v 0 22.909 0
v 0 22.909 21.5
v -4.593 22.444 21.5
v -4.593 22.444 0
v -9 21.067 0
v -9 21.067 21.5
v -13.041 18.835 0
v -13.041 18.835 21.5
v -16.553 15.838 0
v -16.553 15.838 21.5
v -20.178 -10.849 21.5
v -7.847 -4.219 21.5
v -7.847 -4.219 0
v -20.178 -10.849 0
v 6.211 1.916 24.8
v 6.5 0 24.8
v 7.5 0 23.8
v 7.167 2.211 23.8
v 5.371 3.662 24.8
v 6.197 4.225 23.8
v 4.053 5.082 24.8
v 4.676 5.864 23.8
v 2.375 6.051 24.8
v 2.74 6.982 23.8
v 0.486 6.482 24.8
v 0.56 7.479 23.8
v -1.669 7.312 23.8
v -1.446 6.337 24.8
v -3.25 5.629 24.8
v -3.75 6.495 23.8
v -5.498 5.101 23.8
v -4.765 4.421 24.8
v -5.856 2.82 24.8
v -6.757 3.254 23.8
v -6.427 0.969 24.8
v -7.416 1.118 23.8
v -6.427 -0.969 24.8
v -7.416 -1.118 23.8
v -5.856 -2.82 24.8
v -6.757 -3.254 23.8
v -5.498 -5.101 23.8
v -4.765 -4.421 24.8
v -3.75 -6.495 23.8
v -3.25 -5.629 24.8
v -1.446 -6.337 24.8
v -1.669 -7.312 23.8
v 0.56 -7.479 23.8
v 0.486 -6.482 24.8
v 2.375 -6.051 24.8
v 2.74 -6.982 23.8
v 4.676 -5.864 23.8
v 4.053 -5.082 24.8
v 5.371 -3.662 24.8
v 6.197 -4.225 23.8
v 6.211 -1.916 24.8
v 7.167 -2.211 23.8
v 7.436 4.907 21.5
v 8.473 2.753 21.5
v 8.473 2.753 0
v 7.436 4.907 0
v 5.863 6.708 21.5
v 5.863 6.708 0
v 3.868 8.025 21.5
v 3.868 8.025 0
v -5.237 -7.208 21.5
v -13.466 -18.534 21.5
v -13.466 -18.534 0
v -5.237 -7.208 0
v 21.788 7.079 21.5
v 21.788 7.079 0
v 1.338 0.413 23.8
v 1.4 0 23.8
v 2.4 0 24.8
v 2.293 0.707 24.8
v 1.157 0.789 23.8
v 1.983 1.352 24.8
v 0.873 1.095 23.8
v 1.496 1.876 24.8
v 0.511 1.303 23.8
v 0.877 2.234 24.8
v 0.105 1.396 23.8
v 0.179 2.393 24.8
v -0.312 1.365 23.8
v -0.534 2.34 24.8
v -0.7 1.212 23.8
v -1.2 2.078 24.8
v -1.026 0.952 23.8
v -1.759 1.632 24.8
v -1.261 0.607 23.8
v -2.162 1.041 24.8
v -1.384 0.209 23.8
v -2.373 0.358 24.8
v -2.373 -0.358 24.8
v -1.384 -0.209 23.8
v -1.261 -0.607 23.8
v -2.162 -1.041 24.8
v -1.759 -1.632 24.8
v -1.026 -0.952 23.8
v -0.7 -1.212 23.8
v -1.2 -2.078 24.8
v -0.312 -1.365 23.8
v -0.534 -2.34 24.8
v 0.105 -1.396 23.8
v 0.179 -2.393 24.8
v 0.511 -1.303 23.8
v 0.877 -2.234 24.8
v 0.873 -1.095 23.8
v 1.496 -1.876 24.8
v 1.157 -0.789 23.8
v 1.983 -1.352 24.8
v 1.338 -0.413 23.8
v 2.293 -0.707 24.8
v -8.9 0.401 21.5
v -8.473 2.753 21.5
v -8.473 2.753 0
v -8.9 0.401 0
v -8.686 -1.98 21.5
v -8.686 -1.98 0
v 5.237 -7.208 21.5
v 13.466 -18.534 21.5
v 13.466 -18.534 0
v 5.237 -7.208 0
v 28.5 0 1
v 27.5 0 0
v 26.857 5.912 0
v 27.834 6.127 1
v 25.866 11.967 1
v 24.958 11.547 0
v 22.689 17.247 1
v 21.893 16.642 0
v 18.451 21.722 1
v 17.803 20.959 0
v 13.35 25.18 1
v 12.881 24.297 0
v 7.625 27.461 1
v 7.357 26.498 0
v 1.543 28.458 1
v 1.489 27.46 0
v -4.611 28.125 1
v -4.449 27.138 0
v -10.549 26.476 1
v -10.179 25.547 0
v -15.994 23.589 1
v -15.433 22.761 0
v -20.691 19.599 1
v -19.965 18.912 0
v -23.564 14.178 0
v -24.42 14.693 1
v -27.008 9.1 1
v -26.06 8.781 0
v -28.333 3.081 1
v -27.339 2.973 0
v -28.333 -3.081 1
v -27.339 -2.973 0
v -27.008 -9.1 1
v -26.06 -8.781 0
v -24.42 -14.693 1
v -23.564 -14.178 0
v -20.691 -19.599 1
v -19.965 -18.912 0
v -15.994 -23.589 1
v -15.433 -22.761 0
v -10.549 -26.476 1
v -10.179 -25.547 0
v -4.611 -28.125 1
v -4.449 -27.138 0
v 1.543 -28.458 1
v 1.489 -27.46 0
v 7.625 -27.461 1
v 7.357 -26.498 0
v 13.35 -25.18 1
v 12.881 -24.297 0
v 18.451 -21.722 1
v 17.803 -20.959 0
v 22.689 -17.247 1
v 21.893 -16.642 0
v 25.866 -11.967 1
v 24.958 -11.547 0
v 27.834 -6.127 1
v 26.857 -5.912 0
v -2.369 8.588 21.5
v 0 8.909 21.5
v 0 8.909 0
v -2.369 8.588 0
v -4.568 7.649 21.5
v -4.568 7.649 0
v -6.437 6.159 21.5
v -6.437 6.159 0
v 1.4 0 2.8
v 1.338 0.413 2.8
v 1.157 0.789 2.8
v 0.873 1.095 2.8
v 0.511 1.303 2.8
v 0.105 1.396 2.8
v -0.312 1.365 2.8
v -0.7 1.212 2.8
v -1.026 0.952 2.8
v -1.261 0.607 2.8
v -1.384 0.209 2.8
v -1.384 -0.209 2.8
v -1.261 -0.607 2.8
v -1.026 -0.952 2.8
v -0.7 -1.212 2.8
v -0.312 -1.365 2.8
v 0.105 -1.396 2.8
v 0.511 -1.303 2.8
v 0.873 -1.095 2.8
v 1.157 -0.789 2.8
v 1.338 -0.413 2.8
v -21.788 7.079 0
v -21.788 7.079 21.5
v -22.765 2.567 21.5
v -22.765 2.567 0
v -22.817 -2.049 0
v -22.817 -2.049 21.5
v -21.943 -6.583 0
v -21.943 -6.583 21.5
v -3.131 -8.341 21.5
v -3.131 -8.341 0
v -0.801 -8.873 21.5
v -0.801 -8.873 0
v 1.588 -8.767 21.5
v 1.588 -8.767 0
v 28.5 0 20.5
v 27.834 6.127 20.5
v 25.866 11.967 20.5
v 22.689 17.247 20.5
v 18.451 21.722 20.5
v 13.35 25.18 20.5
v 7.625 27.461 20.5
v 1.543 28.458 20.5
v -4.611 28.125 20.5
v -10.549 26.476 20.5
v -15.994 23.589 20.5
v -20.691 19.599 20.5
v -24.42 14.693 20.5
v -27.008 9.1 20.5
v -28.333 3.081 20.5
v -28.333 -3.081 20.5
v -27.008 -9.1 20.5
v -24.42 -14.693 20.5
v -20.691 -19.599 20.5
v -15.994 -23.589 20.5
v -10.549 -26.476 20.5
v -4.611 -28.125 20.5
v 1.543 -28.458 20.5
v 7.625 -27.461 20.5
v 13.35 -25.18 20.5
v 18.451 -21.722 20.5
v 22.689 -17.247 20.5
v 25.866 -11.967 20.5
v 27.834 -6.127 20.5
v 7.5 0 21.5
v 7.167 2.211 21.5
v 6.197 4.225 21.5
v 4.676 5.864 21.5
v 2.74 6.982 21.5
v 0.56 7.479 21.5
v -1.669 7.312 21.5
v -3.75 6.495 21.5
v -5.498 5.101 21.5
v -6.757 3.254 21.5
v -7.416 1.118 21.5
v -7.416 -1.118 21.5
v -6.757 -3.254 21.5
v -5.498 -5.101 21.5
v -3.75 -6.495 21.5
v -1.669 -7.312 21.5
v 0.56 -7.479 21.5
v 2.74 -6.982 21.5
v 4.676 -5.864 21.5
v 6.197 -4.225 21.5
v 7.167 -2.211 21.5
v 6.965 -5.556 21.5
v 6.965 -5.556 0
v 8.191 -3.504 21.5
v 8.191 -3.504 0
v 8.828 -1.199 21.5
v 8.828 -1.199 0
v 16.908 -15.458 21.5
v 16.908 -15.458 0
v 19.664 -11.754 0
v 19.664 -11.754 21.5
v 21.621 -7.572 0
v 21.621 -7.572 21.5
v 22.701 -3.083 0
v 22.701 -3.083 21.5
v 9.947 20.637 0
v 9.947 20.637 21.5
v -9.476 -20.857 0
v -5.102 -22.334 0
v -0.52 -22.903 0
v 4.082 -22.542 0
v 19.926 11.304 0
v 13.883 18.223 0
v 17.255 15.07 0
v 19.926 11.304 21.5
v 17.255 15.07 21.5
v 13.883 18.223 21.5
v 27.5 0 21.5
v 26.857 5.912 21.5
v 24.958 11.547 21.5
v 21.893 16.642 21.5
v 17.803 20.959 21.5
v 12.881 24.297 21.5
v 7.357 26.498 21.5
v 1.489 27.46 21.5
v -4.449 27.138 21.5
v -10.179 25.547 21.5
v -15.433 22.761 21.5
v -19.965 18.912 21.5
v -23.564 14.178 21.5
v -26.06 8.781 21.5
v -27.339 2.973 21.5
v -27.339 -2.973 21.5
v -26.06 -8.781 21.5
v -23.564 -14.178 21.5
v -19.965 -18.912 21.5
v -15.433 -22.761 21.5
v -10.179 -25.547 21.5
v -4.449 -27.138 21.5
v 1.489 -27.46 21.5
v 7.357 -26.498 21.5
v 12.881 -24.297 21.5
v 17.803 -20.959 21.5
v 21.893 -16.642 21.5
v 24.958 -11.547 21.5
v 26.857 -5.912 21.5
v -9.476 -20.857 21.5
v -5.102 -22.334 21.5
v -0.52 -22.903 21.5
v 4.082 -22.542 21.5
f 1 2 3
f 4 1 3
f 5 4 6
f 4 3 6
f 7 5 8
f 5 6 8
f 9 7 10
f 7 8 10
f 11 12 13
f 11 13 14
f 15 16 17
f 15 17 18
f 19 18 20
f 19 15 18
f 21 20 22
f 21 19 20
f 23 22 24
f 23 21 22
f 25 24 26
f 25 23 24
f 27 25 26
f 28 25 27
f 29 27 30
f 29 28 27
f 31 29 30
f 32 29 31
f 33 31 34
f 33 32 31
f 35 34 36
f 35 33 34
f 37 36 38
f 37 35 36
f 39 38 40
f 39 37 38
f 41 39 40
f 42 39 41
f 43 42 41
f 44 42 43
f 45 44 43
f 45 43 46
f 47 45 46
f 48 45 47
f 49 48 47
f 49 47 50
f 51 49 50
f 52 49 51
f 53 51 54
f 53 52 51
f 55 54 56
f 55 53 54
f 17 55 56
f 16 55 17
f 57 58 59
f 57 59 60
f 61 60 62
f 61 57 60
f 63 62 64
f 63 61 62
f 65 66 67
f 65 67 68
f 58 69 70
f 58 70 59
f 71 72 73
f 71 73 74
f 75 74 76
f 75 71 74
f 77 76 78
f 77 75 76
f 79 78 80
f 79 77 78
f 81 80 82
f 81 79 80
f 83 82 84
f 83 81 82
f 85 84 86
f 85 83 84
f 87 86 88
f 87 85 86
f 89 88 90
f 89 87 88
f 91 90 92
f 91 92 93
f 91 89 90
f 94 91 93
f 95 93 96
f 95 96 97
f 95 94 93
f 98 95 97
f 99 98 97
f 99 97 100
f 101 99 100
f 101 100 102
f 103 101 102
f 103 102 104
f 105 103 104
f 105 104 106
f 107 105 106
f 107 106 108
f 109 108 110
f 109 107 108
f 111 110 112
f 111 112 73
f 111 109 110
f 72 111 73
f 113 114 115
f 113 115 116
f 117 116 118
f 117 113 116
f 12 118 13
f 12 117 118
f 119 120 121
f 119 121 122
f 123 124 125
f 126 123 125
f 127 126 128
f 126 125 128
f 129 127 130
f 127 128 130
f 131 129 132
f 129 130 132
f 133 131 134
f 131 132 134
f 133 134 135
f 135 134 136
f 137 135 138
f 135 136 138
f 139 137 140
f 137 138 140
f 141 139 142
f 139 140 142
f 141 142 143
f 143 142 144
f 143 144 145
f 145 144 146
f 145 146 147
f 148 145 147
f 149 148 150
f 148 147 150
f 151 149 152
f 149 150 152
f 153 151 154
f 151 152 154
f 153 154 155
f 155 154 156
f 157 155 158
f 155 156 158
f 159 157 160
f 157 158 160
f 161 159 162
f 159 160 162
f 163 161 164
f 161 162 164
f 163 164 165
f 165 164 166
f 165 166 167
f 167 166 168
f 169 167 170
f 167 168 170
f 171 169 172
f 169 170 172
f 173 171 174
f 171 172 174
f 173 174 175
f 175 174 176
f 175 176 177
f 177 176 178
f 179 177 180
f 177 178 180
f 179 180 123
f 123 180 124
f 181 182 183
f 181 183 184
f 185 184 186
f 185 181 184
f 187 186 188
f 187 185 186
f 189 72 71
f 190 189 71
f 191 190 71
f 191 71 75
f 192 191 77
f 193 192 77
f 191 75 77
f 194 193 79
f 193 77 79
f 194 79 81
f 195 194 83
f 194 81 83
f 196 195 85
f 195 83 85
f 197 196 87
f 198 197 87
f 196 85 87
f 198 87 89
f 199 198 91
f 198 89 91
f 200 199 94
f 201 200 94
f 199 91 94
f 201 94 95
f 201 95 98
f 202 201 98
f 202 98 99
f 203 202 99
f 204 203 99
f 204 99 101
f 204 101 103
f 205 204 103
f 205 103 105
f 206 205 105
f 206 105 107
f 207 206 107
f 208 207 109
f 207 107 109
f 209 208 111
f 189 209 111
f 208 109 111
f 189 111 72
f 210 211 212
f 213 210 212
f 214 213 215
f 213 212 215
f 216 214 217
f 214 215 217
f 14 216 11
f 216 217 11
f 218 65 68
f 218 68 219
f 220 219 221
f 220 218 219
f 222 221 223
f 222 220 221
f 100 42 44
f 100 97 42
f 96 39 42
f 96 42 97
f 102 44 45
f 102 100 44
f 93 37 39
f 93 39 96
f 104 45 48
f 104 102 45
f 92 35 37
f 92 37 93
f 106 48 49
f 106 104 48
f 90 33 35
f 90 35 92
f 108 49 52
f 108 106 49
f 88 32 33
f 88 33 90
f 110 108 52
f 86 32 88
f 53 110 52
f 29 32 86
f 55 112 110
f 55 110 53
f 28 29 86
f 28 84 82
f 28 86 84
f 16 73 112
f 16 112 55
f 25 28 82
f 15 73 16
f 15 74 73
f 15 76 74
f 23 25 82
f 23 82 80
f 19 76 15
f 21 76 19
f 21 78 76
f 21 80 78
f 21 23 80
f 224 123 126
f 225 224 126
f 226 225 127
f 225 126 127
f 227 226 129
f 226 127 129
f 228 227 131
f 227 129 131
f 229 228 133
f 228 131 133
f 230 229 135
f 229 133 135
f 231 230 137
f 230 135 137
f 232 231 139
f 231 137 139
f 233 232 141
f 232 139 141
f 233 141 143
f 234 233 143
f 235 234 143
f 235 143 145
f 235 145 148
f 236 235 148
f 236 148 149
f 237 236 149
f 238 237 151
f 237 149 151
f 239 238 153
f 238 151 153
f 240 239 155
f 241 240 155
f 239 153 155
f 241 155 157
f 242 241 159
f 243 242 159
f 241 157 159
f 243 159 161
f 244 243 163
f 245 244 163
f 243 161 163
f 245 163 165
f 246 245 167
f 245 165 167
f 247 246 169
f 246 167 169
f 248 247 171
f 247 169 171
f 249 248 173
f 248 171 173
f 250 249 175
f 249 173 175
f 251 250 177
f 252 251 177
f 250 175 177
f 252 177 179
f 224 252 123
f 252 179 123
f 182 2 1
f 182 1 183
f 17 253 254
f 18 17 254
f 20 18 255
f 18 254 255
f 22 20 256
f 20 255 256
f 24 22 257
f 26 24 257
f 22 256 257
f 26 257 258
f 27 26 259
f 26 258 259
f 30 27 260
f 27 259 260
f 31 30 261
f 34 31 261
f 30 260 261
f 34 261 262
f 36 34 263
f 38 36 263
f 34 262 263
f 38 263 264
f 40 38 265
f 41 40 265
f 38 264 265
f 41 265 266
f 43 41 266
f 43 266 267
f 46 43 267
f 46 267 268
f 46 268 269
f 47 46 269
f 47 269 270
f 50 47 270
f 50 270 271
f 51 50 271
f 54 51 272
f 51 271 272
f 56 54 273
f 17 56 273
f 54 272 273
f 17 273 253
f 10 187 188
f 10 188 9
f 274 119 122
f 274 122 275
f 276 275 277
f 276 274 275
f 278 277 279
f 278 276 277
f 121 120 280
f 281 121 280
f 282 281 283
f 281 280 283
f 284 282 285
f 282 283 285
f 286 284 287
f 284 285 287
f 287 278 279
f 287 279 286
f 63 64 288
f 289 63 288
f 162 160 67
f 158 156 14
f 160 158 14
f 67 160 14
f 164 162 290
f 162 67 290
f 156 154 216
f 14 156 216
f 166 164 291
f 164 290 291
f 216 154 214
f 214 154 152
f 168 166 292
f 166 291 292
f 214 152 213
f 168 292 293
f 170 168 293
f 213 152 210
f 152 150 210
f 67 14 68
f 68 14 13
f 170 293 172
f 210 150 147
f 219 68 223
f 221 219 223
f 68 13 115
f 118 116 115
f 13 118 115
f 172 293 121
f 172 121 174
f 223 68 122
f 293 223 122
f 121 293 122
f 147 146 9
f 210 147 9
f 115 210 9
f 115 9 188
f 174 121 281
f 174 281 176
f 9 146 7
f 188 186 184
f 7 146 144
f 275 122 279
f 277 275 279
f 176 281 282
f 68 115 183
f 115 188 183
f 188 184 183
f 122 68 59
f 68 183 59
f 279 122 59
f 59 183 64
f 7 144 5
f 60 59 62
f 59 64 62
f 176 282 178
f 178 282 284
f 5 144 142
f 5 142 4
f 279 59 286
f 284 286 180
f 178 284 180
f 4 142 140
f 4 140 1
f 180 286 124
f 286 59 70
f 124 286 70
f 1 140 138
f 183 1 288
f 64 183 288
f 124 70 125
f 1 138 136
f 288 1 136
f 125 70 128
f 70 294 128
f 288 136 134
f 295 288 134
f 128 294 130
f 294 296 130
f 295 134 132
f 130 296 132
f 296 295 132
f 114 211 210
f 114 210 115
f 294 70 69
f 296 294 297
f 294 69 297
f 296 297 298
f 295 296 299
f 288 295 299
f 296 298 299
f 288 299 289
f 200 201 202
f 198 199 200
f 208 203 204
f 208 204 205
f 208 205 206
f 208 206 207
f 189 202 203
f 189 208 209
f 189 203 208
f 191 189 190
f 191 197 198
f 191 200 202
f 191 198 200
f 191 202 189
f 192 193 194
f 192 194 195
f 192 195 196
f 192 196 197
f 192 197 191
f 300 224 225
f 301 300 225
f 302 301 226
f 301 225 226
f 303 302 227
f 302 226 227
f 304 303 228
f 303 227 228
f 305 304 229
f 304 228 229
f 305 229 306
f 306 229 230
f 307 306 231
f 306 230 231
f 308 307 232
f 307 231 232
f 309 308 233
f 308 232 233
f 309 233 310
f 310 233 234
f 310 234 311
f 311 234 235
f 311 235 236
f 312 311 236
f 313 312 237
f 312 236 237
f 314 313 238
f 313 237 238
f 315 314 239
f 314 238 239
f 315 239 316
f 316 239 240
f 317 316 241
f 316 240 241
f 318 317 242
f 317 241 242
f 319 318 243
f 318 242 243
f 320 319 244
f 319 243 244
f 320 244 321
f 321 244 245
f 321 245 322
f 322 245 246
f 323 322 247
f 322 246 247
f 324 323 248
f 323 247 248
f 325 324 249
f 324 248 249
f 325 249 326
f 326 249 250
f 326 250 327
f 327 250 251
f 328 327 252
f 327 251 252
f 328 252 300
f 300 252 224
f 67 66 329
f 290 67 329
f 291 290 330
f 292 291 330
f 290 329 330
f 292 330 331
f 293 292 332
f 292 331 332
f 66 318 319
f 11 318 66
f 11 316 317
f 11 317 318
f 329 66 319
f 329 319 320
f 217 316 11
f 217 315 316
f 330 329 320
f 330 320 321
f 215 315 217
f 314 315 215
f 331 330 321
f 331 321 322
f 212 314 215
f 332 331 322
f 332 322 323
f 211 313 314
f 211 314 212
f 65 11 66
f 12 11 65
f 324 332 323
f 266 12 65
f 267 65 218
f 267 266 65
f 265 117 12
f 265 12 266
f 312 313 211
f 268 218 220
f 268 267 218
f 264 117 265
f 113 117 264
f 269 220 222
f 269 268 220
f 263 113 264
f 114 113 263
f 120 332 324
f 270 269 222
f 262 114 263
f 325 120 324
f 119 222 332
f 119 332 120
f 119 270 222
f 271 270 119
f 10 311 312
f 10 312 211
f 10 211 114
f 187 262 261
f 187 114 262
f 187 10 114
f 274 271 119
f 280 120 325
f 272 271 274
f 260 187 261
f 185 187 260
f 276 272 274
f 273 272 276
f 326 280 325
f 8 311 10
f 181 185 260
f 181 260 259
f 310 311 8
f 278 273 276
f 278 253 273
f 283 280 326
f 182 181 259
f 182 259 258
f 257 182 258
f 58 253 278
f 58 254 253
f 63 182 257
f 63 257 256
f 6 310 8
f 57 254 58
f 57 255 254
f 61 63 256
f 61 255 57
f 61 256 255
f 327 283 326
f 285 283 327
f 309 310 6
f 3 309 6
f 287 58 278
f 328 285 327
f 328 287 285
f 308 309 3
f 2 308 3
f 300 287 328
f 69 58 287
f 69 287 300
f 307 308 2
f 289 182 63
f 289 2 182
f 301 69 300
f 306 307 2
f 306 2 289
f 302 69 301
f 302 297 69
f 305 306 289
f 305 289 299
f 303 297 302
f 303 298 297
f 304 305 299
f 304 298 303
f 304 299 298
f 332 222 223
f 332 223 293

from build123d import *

# Parameters (mm, degrees)
SKETCH_R           = 28.5
PAD_DEPTH          = 21.5
SKETCH001_R        = 7.5
PAD001_DEPTH       = 3.3
SKETCH002_R        = 1.4
POCKET_DEPTH       = 22
POCKET001_DEPTH    = 190.178681
POLARPATTERN_COUNT = 5
CHAMFER_SIZE       = 1
CHAMFER001_SIZE    = 1
CHAMFER002_SIZE    = 1
CHAMFER003_SIZE    = 1


with BuildPart() as part:
    # Sketch → Pad (new body)
    with BuildSketch(Plane.XY):
        Circle(SKETCH_R)
    extrude(amount=PAD_DEPTH)

    # Sketch001 (on Face3 of Pad) → Pad001 (join)
    with BuildSketch(Plane.XY.offset(21.5)):
        Circle(SKETCH001_R)
    extrude(amount=PAD001_DEPTH)

    # Sketch002 (on Face5 of Pad001) → Pocket (cut)
    with BuildSketch(Plane.XY.offset(24.8)):
        Circle(SKETCH002_R)
    extrude(amount=-POCKET_DEPTH, mode=Mode.SUBTRACT)

    # Sketch003 (on Face3 of Pocket) → Pocket001 (cut, through all)
    with BuildSketch(Plane.XY.offset(21.5)):
        with BuildLine():
            Line((-6.437201, 6.159132), (-16.552795, 15.837703))
            ThreePointArc((0, 22.909122), (-9, 21.067223), (-16.552795, 15.837703))
            Line((0, 22.909122), (0, 8.909122))
            ThreePointArc((0, 8.909122), (-3.5, 8.19283), (-6.437201, 6.159132))
        make_face()
    pocket001 = extrude(amount=-POCKET001_DEPTH, mode=Mode.SUBTRACT)

    # PolarPattern: Pocket001 ×5 about axis
    polarpattern_axis = Axis((0, 0, 21.5), (0, 0, 1))
    for i in range(1, POLARPATTERN_COUNT):
        add(pocket001.rotate(polarpattern_axis, i * 360 / POLARPATTERN_COUNT), mode=Mode.SUBTRACT)

    # Chamfer
    chamfer_edges = [part.edges().sort_by_distance(p)[0] for p in [
        (-1.4, 0, 24.8),
    ]]
    chamfer(chamfer_edges, length=CHAMFER_SIZE)

    # Chamfer001
    chamfer001_edges = [part.edges().sort_by_distance(p)[0] for p in [
        (-28.5, 0, 21.5),
    ]]
    chamfer(chamfer001_edges, length=CHAMFER001_SIZE)

    # Chamfer002
    chamfer002_edges = [part.edges().sort_by_distance(p)[0] for p in [
        (-28.5, 0, 0),
    ]]
    chamfer(chamfer002_edges, length=CHAMFER002_SIZE)

    # Chamfer003
    chamfer003_edges = [part.edges().sort_by_distance(p)[0] for p in [
        (-7.5, 0, 24.8),
    ]]
    chamfer(chamfer003_edges, length=CHAMFER003_SIZE)


solid = part.part
